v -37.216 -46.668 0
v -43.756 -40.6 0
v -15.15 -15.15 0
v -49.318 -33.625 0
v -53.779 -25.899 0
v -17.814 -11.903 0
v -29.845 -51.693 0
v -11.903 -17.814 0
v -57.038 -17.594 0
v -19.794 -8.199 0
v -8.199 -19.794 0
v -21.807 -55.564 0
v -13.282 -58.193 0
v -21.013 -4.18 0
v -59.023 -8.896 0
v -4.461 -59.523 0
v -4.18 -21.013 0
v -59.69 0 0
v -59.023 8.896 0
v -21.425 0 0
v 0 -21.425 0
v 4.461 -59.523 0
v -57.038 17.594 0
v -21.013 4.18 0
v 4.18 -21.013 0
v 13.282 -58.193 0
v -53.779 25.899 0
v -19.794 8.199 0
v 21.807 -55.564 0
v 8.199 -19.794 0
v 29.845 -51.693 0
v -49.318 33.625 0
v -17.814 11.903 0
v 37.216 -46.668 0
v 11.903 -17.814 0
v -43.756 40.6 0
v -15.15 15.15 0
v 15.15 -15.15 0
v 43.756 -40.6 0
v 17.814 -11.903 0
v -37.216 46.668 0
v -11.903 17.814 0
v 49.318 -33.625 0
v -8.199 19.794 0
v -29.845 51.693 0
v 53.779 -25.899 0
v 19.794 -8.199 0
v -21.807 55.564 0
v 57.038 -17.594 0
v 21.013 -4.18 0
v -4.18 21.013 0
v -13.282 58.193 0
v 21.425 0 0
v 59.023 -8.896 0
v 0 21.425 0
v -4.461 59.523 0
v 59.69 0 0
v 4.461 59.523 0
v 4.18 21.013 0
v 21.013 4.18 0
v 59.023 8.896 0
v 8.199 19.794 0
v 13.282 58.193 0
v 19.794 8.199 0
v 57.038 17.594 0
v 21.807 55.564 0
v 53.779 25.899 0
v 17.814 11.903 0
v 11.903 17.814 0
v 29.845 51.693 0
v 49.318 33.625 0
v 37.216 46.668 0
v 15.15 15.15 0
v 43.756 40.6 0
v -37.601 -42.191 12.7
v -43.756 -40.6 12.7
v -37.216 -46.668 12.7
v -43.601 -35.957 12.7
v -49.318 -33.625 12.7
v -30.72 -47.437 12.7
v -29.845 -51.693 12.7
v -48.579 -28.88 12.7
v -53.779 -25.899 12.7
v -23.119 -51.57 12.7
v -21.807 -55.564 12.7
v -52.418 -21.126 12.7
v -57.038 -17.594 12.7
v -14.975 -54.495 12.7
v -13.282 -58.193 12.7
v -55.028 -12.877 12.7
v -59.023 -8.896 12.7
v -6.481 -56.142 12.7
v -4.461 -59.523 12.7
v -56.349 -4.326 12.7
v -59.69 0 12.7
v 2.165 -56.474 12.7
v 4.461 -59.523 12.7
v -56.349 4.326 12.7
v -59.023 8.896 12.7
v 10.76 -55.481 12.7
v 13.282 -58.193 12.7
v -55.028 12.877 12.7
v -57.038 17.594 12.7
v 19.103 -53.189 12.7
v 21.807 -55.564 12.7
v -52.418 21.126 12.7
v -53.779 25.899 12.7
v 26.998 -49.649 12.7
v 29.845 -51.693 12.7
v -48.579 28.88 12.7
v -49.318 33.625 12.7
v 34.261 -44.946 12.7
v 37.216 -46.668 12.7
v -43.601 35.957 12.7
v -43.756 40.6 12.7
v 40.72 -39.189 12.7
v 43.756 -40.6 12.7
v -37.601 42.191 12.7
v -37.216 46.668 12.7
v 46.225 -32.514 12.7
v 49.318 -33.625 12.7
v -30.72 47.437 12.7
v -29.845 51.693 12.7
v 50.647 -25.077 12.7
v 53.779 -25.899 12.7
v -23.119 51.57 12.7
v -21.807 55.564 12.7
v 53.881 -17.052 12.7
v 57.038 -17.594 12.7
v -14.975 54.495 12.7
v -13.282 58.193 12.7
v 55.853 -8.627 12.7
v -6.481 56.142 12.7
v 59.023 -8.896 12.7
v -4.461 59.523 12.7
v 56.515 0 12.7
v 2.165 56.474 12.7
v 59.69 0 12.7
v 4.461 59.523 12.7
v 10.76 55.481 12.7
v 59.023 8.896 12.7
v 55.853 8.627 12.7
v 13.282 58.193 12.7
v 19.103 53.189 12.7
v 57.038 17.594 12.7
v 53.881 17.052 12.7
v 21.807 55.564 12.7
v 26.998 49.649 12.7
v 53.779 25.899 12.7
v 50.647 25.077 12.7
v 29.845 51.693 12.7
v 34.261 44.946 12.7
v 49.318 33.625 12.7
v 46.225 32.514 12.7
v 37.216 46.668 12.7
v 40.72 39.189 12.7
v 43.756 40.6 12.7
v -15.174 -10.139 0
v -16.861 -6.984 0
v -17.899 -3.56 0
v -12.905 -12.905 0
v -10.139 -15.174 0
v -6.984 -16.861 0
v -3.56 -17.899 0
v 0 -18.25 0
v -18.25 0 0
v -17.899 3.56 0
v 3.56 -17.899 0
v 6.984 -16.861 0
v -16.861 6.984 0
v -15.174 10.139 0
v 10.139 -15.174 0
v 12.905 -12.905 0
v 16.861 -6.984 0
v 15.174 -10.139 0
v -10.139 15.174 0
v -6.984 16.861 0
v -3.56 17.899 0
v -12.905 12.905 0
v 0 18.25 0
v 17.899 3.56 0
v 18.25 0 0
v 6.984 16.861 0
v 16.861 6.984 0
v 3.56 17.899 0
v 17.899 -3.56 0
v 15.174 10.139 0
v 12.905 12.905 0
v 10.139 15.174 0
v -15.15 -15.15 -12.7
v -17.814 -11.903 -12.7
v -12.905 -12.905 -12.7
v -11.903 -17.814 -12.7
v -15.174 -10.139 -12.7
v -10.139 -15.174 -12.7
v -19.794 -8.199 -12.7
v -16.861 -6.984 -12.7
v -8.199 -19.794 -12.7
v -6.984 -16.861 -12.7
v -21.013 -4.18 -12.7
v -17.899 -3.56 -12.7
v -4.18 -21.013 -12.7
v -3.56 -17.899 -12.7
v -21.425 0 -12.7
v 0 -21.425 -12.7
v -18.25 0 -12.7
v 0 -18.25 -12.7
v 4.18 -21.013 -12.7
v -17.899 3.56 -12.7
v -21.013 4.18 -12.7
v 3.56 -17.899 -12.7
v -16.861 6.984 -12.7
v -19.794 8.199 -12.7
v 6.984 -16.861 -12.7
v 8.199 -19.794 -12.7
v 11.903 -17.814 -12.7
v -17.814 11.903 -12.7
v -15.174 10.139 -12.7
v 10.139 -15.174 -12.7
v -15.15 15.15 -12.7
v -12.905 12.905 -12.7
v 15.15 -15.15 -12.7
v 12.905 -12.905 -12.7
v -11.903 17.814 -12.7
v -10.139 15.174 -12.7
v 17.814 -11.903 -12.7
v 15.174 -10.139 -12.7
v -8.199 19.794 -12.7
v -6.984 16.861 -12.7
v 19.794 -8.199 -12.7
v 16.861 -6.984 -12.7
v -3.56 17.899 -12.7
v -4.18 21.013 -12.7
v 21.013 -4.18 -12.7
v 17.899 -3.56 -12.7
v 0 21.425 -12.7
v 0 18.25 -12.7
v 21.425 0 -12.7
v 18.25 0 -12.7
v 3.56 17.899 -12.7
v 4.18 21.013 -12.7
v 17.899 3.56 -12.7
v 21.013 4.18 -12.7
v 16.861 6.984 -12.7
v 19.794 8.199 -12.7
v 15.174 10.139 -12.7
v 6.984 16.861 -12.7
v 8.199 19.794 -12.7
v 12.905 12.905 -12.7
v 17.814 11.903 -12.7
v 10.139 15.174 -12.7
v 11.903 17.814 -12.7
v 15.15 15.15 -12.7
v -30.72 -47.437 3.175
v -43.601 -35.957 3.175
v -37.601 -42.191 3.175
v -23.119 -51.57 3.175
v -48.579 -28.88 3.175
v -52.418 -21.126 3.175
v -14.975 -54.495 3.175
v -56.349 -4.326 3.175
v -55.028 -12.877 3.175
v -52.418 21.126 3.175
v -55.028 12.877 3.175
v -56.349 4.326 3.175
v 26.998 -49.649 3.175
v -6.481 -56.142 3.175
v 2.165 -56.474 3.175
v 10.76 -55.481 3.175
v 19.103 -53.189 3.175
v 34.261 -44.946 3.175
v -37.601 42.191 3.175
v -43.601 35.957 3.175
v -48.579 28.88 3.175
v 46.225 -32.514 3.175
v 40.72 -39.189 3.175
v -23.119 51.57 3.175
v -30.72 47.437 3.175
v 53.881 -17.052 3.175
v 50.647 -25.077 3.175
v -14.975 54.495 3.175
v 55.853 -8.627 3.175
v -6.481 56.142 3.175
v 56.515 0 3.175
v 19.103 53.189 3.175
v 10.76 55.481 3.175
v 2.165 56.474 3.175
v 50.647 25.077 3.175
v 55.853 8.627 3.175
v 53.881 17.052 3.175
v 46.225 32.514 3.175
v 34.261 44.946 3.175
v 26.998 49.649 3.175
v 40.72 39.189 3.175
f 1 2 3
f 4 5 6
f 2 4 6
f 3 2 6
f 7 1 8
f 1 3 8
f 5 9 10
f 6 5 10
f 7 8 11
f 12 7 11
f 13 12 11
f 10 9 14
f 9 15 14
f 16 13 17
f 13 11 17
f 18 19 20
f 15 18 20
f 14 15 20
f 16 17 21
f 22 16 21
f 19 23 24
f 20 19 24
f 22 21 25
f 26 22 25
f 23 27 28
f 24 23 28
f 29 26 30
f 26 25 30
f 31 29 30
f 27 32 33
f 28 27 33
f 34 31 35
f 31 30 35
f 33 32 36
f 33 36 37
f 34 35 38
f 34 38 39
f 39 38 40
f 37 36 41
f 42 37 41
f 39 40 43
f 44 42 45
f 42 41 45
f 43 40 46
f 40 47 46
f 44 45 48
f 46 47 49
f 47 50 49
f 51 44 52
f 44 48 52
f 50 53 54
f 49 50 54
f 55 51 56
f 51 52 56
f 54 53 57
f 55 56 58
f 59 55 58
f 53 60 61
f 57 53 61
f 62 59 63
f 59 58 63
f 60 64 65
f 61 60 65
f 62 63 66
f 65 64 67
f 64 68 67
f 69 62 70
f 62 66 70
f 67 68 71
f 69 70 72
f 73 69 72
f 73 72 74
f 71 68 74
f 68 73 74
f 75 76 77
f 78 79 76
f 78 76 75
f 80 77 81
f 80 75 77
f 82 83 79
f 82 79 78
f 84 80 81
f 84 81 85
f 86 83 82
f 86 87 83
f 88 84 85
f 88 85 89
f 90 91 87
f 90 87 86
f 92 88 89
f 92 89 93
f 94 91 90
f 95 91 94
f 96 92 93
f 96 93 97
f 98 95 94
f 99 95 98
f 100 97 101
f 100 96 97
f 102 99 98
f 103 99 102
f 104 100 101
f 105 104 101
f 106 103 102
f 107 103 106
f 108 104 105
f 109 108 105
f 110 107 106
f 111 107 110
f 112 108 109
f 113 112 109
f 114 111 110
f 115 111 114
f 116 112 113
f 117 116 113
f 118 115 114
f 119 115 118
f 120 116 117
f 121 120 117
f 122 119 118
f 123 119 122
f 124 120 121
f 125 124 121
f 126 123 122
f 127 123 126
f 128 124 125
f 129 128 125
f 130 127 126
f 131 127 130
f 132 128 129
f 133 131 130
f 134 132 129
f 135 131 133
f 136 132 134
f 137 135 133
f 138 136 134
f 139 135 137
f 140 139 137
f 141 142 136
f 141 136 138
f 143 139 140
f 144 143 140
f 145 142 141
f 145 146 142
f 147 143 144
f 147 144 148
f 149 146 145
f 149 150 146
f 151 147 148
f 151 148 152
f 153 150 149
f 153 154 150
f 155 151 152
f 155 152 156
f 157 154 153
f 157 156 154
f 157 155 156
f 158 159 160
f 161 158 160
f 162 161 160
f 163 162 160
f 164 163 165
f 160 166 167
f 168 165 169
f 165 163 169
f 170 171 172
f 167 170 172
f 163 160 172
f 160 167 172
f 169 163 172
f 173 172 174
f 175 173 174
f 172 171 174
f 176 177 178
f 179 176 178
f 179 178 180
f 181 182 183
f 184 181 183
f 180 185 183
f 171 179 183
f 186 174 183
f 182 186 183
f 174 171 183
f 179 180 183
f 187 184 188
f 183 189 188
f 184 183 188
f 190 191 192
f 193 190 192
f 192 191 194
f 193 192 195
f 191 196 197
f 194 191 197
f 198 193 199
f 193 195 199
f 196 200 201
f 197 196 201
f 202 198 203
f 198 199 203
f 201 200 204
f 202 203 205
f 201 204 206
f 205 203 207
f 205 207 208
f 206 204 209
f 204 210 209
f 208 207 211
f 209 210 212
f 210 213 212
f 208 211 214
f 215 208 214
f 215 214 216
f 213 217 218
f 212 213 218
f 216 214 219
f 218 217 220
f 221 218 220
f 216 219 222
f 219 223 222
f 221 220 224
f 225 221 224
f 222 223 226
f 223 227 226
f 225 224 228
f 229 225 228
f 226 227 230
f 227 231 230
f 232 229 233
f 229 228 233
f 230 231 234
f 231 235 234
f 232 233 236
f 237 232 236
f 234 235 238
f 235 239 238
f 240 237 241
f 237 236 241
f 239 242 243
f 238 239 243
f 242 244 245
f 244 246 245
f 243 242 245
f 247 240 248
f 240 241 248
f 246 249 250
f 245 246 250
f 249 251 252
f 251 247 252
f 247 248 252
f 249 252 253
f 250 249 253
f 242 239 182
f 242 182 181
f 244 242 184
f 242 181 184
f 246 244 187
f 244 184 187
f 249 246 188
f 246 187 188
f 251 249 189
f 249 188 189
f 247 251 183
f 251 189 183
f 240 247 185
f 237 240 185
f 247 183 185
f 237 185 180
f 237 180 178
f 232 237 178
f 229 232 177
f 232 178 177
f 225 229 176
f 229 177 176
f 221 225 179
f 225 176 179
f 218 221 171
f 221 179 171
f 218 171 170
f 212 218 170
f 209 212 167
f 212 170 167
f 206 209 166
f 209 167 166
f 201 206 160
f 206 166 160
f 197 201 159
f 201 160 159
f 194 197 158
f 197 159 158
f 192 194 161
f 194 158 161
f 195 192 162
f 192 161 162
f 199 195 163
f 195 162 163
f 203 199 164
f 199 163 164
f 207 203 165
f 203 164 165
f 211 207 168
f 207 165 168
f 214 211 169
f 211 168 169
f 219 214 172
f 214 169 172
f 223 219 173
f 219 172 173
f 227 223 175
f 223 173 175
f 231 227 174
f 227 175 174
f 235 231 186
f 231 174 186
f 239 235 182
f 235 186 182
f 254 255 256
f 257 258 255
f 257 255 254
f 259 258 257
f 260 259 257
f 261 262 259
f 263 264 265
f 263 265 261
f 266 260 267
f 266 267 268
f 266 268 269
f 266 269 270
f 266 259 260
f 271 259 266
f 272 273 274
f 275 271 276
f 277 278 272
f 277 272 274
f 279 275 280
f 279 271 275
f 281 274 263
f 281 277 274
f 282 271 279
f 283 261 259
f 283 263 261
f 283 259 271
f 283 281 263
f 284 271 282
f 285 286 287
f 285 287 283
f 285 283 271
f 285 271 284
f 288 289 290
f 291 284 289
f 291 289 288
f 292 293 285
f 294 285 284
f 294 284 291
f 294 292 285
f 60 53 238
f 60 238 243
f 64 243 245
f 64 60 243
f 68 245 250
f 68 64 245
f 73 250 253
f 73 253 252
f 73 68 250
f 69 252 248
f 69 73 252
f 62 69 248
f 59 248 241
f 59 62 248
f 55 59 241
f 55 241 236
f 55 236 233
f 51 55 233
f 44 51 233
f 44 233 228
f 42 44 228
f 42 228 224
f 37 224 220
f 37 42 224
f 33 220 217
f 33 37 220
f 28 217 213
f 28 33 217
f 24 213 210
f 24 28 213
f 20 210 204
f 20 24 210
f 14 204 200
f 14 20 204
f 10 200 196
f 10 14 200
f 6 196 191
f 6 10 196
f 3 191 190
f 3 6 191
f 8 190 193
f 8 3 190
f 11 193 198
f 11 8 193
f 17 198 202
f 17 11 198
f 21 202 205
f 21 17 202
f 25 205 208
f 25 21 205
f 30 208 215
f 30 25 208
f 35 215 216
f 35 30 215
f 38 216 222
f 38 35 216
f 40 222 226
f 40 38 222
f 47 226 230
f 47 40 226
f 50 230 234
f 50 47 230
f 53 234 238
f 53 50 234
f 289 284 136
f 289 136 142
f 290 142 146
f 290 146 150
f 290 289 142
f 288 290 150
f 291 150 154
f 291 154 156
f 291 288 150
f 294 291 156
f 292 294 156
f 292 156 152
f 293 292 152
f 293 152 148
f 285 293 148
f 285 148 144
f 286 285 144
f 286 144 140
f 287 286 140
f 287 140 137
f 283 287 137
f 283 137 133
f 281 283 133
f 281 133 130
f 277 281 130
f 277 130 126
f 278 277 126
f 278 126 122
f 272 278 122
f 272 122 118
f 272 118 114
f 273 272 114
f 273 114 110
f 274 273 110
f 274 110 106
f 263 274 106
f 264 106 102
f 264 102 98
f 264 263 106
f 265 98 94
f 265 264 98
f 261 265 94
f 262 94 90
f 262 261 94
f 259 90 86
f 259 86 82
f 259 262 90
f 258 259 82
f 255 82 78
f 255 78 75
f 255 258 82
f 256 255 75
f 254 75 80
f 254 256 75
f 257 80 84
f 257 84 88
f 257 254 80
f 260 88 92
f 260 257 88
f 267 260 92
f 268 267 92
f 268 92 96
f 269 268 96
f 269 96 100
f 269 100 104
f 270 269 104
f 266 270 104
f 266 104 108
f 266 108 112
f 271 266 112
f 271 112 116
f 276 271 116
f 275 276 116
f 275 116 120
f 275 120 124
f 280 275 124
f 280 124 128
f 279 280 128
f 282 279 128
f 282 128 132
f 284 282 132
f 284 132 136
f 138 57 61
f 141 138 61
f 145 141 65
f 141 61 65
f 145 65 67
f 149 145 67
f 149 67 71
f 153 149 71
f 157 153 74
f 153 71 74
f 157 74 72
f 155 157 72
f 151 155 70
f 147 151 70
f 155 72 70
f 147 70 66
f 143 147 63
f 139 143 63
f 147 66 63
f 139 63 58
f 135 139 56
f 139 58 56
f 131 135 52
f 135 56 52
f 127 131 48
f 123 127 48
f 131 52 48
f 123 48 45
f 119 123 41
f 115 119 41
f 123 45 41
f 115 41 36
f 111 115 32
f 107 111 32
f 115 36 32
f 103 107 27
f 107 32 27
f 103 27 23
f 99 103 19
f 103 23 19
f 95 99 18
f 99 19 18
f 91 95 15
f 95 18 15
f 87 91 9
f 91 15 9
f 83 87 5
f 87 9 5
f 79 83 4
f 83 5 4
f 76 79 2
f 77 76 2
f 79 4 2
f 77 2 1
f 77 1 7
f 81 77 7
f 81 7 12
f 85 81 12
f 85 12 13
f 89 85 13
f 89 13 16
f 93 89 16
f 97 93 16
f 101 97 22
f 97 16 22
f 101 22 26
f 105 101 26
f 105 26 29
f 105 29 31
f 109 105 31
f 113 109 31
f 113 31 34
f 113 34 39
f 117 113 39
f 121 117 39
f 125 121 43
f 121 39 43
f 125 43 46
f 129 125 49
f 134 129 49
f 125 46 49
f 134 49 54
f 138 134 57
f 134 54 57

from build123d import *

# Parameters (mm, degrees)
F0_R     = 59.69
F0_R_2   = 56.515
F1_DEPTH = 12.7
F2_DEPTH = 3.175
F3_R     = 21.425
F3_R_2   = 18.25
F4_DEPTH = 12.7


# Not quite as in the source:
# - a feature names something its author has since deleted; it is built from what else it names


with BuildPart() as f1:
    # F0 (on Top) → F1 (new body)
    with BuildSketch(Plane.XY):
        Circle(F0_R)
        Circle(F0_R_2, mode=Mode.SUBTRACT)
    extrude(amount=F1_DEPTH)

    # F0 (on Top) → F2 (join)
    with BuildSketch(Plane.XY):
        Circle(F0_R_2)
    extrude(amount=F2_DEPTH)

    # F3 (on face) → F4 (join)
    with BuildSketch(Plane.XY):
        Circle(F3_R)
        Circle(F3_R_2, mode=Mode.SUBTRACT)
    extrude(amount=-F4_DEPTH)


solid = f1.part
